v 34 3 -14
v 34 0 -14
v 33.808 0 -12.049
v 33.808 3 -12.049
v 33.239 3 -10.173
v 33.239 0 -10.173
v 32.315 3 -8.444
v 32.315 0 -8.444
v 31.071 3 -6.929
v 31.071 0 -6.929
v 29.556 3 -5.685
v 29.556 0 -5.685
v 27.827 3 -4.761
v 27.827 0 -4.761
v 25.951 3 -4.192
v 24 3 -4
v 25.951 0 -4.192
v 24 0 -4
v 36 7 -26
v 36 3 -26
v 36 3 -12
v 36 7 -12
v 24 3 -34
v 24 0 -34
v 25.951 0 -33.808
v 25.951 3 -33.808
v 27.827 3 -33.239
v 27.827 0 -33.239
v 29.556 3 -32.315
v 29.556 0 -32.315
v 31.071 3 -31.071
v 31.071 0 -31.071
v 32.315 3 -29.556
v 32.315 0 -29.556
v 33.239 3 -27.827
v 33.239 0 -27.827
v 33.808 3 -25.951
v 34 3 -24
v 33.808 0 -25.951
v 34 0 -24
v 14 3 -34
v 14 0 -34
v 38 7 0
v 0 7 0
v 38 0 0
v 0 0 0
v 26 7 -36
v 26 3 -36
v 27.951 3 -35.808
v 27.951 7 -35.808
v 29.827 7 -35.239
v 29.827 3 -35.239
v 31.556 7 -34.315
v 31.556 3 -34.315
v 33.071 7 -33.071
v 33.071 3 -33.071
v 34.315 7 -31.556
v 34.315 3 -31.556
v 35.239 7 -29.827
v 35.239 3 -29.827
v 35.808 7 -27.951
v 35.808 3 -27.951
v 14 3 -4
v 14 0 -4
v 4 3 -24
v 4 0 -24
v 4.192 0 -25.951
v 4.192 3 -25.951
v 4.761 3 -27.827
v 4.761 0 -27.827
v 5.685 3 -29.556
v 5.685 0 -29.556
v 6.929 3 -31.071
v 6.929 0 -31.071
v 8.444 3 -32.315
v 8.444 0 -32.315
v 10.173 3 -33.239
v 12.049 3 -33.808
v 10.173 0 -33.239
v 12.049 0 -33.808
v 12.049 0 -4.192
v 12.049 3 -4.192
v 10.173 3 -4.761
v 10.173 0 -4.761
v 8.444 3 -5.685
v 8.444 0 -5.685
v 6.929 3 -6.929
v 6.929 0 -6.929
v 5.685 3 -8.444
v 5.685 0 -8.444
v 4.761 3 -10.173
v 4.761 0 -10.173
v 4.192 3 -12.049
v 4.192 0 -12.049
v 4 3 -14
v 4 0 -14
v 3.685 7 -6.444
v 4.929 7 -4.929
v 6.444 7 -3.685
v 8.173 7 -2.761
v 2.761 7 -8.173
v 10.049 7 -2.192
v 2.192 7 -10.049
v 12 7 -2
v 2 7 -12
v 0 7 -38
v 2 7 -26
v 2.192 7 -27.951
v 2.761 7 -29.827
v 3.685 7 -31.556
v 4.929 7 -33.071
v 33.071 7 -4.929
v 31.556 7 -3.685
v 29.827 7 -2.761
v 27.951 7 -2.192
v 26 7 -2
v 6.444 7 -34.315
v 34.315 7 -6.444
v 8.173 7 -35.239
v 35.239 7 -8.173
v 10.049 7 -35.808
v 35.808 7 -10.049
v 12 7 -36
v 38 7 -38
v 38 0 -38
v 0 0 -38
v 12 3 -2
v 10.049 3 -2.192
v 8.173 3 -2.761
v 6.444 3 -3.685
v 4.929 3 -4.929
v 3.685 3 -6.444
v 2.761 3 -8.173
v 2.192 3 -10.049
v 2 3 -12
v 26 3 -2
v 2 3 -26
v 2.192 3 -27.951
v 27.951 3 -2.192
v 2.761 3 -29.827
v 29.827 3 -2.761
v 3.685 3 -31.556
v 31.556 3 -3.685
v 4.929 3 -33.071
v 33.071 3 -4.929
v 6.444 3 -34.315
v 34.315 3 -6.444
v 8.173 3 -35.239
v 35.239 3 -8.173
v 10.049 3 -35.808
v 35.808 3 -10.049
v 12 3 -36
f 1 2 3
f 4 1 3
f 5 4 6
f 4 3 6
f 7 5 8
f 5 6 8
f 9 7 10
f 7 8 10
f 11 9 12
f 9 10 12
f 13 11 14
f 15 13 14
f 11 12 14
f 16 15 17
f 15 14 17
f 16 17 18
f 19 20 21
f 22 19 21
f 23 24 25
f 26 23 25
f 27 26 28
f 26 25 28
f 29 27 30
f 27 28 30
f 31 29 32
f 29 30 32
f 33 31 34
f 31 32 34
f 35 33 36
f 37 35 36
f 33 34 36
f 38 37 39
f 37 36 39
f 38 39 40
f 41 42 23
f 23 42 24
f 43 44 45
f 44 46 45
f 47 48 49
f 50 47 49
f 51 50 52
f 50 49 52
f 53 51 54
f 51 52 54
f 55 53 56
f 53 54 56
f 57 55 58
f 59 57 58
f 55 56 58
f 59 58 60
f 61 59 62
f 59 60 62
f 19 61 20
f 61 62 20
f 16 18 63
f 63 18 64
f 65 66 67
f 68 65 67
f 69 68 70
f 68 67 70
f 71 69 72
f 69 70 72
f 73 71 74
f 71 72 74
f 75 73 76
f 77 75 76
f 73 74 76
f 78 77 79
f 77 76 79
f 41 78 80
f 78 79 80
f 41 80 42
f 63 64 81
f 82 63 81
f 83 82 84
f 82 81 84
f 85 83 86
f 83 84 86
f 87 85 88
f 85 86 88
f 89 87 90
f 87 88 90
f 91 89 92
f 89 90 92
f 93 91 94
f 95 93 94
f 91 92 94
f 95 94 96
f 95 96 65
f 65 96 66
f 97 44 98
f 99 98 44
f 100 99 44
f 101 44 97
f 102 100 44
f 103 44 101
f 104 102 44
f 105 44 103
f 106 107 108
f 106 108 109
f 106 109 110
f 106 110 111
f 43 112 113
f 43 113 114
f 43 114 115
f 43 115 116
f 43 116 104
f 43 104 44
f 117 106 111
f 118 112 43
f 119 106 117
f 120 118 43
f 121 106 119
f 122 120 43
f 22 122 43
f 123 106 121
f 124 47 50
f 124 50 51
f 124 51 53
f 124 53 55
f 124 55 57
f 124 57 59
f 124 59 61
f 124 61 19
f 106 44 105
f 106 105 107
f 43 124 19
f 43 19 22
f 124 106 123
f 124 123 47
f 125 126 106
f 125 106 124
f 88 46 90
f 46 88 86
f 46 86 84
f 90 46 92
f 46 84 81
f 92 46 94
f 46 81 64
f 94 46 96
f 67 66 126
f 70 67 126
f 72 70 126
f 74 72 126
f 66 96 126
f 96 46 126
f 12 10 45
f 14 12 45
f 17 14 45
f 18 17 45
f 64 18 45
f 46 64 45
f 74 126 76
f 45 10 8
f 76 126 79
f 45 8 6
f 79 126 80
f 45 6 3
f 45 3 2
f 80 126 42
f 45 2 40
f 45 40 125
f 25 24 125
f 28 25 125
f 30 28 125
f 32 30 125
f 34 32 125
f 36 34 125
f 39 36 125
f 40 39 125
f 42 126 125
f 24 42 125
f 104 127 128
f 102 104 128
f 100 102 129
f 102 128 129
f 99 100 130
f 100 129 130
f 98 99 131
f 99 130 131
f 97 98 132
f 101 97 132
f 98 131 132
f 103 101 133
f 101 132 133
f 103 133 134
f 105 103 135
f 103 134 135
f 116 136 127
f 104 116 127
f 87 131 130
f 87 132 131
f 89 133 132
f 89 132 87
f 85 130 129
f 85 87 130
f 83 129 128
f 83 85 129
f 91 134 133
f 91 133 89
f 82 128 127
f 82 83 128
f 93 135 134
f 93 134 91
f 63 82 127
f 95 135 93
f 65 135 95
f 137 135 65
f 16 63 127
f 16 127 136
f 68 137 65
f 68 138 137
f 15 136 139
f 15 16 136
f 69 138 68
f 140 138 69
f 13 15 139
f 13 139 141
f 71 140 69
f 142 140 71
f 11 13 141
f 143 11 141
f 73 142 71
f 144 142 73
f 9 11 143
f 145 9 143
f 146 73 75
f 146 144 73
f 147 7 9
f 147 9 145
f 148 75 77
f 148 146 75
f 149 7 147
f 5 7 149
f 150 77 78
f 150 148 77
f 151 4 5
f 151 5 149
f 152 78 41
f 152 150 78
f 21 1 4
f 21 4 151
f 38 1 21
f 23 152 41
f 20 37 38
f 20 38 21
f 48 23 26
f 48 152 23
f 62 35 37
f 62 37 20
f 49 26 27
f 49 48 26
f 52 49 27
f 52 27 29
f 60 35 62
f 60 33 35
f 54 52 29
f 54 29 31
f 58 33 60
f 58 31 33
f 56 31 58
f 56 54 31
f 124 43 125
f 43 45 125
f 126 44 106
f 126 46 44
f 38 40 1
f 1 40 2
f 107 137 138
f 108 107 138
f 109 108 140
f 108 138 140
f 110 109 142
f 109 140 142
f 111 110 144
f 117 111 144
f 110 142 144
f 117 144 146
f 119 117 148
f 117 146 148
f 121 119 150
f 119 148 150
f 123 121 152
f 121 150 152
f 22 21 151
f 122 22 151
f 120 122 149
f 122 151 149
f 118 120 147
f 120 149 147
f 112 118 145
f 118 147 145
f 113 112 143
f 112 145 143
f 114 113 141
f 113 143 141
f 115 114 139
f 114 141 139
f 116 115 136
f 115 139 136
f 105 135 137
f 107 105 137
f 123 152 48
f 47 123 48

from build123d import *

# Parameters (mm, degrees)
SKETCH1_W           = 38
SKETCH1_H           = 38
BOSS_EXTRUDE1_DEPTH = 3
SKETCH2_W           = 38
SKETCH2_H           = 38
BOSS_EXTRUDE2_DEPTH = 4


with BuildPart() as part:
    # Sketch1 → Boss-Extrude1 (new body)
    with BuildSketch(Plane(origin=(0, 0, 0), x_dir=(1, 0, 0), z_dir=(0, 1, 0))):
        with Locations((19, 19)):
            Rectangle(SKETCH1_W, SKETCH1_H)
        with BuildLine():
            Line((14, 34), (24, 34))
            ThreePointArc((24, 34), (31.071067812, 31.071067812), (34, 24))
            Line((34, 24), (34, 14))
            ThreePointArc((34, 14), (31.071067812, 6.928932188), (24, 4))
            Line((24, 4), (14, 4))
            ThreePointArc((14, 4), (6.928932188, 6.928932188), (4, 14))
            Line((4, 14), (4, 24))
            ThreePointArc((4, 24), (6.928932188, 31.071067812), (14, 34))
        make_face(mode=Mode.SUBTRACT)
    extrude(amount=BOSS_EXTRUDE1_DEPTH)

    # Sketch2 → Boss-Extrude2 (add)
    with BuildSketch(Plane(origin=(0, 3, 0), x_dir=(1, 0, 0), z_dir=(0, 1, 0))):
        with Locations((19, 19)):
            Rectangle(SKETCH2_W, SKETCH2_H)
        with BuildLine():
            Line((12, 36), (26, 36))
            ThreePointArc((26, 36), (33.071067812, 33.071067812), (36, 26))
            Line((36, 26), (36, 12))
            ThreePointArc((36, 12), (33.071067812, 4.928932188), (26, 2))
            Line((26, 2), (12, 2))
            ThreePointArc((12, 2), (4.928932188, 4.928932188), (2, 12))
            Line((2, 12), (2, 26))
            ThreePointArc((2, 26), (4.928932188, 33.071067812), (12, 36))
        make_face(mode=Mode.SUBTRACT)
    extrude(amount=BOSS_EXTRUDE2_DEPTH)


solid = part.part
